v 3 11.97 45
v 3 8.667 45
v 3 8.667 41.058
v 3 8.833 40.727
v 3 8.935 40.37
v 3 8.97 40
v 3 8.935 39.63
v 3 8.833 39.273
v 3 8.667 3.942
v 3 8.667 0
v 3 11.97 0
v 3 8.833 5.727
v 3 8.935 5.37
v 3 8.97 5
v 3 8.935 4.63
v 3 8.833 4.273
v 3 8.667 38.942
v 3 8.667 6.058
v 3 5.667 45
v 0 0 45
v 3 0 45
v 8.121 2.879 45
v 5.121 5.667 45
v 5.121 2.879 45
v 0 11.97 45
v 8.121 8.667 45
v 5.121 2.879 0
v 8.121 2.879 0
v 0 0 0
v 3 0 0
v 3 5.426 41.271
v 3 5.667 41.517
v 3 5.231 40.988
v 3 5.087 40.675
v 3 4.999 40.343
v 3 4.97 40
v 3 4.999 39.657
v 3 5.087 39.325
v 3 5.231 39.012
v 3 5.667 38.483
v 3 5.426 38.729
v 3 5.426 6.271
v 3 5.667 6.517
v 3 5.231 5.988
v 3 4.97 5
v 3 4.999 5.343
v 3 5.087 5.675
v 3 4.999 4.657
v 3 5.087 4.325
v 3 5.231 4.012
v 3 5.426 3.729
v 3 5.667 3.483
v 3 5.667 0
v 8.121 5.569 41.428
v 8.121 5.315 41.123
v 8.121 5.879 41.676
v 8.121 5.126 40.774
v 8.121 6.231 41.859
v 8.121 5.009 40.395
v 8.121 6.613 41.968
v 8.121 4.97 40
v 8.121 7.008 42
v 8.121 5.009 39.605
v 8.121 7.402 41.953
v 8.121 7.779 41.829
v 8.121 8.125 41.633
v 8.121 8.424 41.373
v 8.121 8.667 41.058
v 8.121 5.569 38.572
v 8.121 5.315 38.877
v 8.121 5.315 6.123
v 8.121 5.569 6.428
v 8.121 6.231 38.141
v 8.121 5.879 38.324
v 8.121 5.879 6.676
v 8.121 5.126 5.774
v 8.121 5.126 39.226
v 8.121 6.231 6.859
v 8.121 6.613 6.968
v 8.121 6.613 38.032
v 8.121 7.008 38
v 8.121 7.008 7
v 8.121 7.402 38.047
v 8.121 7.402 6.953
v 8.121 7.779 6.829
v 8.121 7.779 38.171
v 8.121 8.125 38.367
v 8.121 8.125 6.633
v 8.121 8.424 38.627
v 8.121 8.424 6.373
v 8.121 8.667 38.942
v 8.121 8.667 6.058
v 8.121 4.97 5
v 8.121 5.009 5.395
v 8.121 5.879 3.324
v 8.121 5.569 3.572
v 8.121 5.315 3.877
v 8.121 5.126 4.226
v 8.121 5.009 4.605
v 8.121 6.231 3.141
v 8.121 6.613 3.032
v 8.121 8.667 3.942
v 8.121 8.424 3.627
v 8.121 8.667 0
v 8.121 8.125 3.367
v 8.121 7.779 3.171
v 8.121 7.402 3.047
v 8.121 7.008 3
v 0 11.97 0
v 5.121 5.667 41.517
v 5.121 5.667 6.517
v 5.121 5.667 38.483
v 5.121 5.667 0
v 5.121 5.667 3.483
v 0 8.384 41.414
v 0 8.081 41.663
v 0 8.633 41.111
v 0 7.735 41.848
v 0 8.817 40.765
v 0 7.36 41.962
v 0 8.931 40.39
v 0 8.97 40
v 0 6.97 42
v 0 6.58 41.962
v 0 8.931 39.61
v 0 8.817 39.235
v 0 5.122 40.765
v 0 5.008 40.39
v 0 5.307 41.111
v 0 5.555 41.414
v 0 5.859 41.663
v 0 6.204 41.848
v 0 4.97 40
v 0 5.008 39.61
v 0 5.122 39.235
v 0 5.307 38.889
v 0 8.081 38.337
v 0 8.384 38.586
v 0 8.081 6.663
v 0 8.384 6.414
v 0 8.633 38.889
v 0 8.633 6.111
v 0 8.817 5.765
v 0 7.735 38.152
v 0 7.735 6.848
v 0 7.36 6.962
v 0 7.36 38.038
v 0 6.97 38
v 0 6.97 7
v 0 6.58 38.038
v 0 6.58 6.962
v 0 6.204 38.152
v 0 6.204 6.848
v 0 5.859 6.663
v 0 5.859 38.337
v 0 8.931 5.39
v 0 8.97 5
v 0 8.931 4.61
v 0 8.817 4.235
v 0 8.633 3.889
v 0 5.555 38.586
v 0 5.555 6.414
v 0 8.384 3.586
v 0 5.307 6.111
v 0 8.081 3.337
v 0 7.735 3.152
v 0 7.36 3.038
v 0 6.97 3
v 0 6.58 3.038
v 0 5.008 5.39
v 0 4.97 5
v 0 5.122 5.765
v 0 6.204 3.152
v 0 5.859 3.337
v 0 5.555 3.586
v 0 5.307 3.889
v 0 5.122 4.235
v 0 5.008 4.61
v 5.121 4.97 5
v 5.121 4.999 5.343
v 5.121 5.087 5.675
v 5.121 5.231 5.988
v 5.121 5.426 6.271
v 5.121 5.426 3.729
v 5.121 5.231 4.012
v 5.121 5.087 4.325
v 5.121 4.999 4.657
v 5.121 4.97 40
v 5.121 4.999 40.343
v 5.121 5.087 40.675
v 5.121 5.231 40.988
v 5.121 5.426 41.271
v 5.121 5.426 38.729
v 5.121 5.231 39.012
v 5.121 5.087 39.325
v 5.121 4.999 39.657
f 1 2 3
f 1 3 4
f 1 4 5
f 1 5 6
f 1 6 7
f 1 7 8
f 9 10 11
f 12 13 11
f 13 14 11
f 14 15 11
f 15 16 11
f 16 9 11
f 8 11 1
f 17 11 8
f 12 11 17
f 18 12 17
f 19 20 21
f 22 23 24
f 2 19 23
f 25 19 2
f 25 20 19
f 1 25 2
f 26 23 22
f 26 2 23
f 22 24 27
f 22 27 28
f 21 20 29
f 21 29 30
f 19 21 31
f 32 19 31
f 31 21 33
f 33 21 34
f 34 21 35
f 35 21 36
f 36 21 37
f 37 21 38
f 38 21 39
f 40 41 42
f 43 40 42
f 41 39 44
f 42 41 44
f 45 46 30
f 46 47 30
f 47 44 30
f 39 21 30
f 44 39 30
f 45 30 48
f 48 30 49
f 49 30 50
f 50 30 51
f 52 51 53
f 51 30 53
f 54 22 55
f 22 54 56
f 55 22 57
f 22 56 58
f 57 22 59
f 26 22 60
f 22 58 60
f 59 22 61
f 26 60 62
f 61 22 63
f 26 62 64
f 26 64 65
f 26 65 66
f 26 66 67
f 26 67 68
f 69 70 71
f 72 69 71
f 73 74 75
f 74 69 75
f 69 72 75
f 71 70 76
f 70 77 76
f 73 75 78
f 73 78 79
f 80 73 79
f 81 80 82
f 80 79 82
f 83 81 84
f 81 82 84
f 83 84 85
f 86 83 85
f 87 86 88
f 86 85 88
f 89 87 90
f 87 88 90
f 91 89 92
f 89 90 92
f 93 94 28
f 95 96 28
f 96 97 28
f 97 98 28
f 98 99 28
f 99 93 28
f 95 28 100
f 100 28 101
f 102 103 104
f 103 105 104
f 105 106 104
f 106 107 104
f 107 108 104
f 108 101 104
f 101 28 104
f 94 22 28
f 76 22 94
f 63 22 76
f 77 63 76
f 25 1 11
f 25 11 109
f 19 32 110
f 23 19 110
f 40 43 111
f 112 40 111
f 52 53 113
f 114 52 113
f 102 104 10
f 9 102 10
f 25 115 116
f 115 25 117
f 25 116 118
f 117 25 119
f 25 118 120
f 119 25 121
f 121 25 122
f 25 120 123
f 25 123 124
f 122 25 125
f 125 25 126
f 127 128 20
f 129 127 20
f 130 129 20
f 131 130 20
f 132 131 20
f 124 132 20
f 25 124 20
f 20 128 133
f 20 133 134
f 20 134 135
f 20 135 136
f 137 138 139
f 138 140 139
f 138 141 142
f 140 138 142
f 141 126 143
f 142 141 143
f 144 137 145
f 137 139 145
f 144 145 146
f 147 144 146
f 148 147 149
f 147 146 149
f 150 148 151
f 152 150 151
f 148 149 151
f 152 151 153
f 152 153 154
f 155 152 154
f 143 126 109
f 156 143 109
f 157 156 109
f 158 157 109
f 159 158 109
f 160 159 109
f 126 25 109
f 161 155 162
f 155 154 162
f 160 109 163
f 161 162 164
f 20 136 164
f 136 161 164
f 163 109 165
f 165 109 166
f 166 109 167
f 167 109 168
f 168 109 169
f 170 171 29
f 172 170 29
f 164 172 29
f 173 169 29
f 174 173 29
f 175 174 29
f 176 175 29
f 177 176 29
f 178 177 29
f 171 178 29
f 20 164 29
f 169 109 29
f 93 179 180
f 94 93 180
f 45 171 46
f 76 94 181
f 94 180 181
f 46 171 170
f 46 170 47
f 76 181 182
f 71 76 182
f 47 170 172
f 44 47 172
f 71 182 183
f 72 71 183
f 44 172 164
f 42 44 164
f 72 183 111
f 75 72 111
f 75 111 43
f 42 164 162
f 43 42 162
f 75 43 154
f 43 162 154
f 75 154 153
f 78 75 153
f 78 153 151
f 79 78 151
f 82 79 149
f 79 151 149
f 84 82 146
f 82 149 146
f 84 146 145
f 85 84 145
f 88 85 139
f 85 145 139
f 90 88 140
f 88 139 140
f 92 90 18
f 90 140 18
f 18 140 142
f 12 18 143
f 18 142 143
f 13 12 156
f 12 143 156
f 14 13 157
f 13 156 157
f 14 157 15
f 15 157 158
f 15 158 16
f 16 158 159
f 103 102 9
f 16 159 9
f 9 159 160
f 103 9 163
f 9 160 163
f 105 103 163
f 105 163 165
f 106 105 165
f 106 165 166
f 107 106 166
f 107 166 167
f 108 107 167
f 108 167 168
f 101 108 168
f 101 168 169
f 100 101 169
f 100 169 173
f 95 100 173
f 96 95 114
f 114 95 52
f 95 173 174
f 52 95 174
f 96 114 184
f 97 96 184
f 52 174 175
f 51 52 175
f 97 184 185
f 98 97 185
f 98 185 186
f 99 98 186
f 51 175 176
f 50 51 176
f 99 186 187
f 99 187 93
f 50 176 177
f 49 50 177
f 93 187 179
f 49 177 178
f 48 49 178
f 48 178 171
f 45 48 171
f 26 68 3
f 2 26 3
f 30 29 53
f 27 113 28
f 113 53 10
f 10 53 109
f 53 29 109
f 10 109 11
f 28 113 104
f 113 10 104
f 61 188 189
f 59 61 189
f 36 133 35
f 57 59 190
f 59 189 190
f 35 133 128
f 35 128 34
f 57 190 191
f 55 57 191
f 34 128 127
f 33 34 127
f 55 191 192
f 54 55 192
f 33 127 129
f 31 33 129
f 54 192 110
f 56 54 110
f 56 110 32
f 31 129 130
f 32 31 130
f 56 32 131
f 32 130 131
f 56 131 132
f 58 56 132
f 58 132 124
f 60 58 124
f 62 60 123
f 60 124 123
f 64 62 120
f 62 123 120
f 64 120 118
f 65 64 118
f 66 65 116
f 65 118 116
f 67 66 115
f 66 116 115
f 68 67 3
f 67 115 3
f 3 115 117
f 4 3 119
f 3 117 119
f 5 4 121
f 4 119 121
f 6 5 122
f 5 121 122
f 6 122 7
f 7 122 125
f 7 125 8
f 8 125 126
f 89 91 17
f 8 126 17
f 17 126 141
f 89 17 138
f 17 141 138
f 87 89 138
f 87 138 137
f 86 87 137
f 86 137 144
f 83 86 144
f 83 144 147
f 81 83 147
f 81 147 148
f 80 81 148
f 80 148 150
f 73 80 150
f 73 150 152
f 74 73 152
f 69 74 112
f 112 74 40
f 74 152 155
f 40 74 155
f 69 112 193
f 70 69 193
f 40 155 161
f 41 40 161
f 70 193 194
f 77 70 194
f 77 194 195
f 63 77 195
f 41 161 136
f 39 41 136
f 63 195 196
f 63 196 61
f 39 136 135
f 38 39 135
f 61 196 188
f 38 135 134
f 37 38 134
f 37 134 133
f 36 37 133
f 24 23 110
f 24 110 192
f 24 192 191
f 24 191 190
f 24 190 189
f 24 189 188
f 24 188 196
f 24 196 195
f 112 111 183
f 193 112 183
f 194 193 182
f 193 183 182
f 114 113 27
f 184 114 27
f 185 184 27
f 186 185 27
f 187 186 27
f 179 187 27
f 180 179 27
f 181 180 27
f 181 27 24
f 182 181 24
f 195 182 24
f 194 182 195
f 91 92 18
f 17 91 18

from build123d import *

# Parameters (mm, degrees)
F1_DEPTH = 45
F2_R     = 2
F3_DEPTH = 8.122212


with BuildPart() as f1:
    # F0 (on Top) → F1 (new body)
    with BuildSketch(Plane.XY):
        Polygon((0, 11.969698), (0, 0), (3, 0), (3, 5.666667), (5.121212, 5.666667), (5.121212, 2.878788), (8.121212, 2.878788), (8.121212, 8.666667), (3, 8.666667), (3, 11.969698), align=None)
    extrude(amount=F1_DEPTH)

    # F2 (on face) → F3 (cut, through all)
    with BuildSketch(Plane(origin=(0, 0, 0), x_dir=(0, -1, 0), z_dir=(-1, 0, 0))):
        with Locations((-6.969698, 5)):
            Circle(F2_R)
        with Locations((-6.969698, 40)):
            Circle(F2_R)
    extrude(amount=-F3_DEPTH, mode=Mode.SUBTRACT)


solid = f1.part
